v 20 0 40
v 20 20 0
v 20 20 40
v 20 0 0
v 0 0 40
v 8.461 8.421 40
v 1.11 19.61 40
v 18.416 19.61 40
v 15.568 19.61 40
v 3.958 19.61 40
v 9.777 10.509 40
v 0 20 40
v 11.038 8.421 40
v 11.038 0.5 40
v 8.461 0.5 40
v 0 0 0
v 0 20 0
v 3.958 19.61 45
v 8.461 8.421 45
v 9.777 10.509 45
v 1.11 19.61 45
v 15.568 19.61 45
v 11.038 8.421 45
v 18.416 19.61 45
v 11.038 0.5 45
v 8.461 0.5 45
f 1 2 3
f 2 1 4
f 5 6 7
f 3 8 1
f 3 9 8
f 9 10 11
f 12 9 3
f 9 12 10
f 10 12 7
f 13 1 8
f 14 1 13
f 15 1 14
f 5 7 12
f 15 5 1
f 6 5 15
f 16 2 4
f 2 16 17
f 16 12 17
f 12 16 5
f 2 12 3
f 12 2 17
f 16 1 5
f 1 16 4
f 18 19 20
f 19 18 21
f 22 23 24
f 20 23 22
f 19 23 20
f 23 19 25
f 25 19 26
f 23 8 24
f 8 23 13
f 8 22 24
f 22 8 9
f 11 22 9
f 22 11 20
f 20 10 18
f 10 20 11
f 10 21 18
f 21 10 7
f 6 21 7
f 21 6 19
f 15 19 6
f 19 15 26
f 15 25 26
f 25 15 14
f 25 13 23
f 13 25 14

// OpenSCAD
cube([20, 20, 40]);
translate([0.5, 0.5, 40]){
    linear_extrude(5){
        text("Y", size=20);
    }
}
